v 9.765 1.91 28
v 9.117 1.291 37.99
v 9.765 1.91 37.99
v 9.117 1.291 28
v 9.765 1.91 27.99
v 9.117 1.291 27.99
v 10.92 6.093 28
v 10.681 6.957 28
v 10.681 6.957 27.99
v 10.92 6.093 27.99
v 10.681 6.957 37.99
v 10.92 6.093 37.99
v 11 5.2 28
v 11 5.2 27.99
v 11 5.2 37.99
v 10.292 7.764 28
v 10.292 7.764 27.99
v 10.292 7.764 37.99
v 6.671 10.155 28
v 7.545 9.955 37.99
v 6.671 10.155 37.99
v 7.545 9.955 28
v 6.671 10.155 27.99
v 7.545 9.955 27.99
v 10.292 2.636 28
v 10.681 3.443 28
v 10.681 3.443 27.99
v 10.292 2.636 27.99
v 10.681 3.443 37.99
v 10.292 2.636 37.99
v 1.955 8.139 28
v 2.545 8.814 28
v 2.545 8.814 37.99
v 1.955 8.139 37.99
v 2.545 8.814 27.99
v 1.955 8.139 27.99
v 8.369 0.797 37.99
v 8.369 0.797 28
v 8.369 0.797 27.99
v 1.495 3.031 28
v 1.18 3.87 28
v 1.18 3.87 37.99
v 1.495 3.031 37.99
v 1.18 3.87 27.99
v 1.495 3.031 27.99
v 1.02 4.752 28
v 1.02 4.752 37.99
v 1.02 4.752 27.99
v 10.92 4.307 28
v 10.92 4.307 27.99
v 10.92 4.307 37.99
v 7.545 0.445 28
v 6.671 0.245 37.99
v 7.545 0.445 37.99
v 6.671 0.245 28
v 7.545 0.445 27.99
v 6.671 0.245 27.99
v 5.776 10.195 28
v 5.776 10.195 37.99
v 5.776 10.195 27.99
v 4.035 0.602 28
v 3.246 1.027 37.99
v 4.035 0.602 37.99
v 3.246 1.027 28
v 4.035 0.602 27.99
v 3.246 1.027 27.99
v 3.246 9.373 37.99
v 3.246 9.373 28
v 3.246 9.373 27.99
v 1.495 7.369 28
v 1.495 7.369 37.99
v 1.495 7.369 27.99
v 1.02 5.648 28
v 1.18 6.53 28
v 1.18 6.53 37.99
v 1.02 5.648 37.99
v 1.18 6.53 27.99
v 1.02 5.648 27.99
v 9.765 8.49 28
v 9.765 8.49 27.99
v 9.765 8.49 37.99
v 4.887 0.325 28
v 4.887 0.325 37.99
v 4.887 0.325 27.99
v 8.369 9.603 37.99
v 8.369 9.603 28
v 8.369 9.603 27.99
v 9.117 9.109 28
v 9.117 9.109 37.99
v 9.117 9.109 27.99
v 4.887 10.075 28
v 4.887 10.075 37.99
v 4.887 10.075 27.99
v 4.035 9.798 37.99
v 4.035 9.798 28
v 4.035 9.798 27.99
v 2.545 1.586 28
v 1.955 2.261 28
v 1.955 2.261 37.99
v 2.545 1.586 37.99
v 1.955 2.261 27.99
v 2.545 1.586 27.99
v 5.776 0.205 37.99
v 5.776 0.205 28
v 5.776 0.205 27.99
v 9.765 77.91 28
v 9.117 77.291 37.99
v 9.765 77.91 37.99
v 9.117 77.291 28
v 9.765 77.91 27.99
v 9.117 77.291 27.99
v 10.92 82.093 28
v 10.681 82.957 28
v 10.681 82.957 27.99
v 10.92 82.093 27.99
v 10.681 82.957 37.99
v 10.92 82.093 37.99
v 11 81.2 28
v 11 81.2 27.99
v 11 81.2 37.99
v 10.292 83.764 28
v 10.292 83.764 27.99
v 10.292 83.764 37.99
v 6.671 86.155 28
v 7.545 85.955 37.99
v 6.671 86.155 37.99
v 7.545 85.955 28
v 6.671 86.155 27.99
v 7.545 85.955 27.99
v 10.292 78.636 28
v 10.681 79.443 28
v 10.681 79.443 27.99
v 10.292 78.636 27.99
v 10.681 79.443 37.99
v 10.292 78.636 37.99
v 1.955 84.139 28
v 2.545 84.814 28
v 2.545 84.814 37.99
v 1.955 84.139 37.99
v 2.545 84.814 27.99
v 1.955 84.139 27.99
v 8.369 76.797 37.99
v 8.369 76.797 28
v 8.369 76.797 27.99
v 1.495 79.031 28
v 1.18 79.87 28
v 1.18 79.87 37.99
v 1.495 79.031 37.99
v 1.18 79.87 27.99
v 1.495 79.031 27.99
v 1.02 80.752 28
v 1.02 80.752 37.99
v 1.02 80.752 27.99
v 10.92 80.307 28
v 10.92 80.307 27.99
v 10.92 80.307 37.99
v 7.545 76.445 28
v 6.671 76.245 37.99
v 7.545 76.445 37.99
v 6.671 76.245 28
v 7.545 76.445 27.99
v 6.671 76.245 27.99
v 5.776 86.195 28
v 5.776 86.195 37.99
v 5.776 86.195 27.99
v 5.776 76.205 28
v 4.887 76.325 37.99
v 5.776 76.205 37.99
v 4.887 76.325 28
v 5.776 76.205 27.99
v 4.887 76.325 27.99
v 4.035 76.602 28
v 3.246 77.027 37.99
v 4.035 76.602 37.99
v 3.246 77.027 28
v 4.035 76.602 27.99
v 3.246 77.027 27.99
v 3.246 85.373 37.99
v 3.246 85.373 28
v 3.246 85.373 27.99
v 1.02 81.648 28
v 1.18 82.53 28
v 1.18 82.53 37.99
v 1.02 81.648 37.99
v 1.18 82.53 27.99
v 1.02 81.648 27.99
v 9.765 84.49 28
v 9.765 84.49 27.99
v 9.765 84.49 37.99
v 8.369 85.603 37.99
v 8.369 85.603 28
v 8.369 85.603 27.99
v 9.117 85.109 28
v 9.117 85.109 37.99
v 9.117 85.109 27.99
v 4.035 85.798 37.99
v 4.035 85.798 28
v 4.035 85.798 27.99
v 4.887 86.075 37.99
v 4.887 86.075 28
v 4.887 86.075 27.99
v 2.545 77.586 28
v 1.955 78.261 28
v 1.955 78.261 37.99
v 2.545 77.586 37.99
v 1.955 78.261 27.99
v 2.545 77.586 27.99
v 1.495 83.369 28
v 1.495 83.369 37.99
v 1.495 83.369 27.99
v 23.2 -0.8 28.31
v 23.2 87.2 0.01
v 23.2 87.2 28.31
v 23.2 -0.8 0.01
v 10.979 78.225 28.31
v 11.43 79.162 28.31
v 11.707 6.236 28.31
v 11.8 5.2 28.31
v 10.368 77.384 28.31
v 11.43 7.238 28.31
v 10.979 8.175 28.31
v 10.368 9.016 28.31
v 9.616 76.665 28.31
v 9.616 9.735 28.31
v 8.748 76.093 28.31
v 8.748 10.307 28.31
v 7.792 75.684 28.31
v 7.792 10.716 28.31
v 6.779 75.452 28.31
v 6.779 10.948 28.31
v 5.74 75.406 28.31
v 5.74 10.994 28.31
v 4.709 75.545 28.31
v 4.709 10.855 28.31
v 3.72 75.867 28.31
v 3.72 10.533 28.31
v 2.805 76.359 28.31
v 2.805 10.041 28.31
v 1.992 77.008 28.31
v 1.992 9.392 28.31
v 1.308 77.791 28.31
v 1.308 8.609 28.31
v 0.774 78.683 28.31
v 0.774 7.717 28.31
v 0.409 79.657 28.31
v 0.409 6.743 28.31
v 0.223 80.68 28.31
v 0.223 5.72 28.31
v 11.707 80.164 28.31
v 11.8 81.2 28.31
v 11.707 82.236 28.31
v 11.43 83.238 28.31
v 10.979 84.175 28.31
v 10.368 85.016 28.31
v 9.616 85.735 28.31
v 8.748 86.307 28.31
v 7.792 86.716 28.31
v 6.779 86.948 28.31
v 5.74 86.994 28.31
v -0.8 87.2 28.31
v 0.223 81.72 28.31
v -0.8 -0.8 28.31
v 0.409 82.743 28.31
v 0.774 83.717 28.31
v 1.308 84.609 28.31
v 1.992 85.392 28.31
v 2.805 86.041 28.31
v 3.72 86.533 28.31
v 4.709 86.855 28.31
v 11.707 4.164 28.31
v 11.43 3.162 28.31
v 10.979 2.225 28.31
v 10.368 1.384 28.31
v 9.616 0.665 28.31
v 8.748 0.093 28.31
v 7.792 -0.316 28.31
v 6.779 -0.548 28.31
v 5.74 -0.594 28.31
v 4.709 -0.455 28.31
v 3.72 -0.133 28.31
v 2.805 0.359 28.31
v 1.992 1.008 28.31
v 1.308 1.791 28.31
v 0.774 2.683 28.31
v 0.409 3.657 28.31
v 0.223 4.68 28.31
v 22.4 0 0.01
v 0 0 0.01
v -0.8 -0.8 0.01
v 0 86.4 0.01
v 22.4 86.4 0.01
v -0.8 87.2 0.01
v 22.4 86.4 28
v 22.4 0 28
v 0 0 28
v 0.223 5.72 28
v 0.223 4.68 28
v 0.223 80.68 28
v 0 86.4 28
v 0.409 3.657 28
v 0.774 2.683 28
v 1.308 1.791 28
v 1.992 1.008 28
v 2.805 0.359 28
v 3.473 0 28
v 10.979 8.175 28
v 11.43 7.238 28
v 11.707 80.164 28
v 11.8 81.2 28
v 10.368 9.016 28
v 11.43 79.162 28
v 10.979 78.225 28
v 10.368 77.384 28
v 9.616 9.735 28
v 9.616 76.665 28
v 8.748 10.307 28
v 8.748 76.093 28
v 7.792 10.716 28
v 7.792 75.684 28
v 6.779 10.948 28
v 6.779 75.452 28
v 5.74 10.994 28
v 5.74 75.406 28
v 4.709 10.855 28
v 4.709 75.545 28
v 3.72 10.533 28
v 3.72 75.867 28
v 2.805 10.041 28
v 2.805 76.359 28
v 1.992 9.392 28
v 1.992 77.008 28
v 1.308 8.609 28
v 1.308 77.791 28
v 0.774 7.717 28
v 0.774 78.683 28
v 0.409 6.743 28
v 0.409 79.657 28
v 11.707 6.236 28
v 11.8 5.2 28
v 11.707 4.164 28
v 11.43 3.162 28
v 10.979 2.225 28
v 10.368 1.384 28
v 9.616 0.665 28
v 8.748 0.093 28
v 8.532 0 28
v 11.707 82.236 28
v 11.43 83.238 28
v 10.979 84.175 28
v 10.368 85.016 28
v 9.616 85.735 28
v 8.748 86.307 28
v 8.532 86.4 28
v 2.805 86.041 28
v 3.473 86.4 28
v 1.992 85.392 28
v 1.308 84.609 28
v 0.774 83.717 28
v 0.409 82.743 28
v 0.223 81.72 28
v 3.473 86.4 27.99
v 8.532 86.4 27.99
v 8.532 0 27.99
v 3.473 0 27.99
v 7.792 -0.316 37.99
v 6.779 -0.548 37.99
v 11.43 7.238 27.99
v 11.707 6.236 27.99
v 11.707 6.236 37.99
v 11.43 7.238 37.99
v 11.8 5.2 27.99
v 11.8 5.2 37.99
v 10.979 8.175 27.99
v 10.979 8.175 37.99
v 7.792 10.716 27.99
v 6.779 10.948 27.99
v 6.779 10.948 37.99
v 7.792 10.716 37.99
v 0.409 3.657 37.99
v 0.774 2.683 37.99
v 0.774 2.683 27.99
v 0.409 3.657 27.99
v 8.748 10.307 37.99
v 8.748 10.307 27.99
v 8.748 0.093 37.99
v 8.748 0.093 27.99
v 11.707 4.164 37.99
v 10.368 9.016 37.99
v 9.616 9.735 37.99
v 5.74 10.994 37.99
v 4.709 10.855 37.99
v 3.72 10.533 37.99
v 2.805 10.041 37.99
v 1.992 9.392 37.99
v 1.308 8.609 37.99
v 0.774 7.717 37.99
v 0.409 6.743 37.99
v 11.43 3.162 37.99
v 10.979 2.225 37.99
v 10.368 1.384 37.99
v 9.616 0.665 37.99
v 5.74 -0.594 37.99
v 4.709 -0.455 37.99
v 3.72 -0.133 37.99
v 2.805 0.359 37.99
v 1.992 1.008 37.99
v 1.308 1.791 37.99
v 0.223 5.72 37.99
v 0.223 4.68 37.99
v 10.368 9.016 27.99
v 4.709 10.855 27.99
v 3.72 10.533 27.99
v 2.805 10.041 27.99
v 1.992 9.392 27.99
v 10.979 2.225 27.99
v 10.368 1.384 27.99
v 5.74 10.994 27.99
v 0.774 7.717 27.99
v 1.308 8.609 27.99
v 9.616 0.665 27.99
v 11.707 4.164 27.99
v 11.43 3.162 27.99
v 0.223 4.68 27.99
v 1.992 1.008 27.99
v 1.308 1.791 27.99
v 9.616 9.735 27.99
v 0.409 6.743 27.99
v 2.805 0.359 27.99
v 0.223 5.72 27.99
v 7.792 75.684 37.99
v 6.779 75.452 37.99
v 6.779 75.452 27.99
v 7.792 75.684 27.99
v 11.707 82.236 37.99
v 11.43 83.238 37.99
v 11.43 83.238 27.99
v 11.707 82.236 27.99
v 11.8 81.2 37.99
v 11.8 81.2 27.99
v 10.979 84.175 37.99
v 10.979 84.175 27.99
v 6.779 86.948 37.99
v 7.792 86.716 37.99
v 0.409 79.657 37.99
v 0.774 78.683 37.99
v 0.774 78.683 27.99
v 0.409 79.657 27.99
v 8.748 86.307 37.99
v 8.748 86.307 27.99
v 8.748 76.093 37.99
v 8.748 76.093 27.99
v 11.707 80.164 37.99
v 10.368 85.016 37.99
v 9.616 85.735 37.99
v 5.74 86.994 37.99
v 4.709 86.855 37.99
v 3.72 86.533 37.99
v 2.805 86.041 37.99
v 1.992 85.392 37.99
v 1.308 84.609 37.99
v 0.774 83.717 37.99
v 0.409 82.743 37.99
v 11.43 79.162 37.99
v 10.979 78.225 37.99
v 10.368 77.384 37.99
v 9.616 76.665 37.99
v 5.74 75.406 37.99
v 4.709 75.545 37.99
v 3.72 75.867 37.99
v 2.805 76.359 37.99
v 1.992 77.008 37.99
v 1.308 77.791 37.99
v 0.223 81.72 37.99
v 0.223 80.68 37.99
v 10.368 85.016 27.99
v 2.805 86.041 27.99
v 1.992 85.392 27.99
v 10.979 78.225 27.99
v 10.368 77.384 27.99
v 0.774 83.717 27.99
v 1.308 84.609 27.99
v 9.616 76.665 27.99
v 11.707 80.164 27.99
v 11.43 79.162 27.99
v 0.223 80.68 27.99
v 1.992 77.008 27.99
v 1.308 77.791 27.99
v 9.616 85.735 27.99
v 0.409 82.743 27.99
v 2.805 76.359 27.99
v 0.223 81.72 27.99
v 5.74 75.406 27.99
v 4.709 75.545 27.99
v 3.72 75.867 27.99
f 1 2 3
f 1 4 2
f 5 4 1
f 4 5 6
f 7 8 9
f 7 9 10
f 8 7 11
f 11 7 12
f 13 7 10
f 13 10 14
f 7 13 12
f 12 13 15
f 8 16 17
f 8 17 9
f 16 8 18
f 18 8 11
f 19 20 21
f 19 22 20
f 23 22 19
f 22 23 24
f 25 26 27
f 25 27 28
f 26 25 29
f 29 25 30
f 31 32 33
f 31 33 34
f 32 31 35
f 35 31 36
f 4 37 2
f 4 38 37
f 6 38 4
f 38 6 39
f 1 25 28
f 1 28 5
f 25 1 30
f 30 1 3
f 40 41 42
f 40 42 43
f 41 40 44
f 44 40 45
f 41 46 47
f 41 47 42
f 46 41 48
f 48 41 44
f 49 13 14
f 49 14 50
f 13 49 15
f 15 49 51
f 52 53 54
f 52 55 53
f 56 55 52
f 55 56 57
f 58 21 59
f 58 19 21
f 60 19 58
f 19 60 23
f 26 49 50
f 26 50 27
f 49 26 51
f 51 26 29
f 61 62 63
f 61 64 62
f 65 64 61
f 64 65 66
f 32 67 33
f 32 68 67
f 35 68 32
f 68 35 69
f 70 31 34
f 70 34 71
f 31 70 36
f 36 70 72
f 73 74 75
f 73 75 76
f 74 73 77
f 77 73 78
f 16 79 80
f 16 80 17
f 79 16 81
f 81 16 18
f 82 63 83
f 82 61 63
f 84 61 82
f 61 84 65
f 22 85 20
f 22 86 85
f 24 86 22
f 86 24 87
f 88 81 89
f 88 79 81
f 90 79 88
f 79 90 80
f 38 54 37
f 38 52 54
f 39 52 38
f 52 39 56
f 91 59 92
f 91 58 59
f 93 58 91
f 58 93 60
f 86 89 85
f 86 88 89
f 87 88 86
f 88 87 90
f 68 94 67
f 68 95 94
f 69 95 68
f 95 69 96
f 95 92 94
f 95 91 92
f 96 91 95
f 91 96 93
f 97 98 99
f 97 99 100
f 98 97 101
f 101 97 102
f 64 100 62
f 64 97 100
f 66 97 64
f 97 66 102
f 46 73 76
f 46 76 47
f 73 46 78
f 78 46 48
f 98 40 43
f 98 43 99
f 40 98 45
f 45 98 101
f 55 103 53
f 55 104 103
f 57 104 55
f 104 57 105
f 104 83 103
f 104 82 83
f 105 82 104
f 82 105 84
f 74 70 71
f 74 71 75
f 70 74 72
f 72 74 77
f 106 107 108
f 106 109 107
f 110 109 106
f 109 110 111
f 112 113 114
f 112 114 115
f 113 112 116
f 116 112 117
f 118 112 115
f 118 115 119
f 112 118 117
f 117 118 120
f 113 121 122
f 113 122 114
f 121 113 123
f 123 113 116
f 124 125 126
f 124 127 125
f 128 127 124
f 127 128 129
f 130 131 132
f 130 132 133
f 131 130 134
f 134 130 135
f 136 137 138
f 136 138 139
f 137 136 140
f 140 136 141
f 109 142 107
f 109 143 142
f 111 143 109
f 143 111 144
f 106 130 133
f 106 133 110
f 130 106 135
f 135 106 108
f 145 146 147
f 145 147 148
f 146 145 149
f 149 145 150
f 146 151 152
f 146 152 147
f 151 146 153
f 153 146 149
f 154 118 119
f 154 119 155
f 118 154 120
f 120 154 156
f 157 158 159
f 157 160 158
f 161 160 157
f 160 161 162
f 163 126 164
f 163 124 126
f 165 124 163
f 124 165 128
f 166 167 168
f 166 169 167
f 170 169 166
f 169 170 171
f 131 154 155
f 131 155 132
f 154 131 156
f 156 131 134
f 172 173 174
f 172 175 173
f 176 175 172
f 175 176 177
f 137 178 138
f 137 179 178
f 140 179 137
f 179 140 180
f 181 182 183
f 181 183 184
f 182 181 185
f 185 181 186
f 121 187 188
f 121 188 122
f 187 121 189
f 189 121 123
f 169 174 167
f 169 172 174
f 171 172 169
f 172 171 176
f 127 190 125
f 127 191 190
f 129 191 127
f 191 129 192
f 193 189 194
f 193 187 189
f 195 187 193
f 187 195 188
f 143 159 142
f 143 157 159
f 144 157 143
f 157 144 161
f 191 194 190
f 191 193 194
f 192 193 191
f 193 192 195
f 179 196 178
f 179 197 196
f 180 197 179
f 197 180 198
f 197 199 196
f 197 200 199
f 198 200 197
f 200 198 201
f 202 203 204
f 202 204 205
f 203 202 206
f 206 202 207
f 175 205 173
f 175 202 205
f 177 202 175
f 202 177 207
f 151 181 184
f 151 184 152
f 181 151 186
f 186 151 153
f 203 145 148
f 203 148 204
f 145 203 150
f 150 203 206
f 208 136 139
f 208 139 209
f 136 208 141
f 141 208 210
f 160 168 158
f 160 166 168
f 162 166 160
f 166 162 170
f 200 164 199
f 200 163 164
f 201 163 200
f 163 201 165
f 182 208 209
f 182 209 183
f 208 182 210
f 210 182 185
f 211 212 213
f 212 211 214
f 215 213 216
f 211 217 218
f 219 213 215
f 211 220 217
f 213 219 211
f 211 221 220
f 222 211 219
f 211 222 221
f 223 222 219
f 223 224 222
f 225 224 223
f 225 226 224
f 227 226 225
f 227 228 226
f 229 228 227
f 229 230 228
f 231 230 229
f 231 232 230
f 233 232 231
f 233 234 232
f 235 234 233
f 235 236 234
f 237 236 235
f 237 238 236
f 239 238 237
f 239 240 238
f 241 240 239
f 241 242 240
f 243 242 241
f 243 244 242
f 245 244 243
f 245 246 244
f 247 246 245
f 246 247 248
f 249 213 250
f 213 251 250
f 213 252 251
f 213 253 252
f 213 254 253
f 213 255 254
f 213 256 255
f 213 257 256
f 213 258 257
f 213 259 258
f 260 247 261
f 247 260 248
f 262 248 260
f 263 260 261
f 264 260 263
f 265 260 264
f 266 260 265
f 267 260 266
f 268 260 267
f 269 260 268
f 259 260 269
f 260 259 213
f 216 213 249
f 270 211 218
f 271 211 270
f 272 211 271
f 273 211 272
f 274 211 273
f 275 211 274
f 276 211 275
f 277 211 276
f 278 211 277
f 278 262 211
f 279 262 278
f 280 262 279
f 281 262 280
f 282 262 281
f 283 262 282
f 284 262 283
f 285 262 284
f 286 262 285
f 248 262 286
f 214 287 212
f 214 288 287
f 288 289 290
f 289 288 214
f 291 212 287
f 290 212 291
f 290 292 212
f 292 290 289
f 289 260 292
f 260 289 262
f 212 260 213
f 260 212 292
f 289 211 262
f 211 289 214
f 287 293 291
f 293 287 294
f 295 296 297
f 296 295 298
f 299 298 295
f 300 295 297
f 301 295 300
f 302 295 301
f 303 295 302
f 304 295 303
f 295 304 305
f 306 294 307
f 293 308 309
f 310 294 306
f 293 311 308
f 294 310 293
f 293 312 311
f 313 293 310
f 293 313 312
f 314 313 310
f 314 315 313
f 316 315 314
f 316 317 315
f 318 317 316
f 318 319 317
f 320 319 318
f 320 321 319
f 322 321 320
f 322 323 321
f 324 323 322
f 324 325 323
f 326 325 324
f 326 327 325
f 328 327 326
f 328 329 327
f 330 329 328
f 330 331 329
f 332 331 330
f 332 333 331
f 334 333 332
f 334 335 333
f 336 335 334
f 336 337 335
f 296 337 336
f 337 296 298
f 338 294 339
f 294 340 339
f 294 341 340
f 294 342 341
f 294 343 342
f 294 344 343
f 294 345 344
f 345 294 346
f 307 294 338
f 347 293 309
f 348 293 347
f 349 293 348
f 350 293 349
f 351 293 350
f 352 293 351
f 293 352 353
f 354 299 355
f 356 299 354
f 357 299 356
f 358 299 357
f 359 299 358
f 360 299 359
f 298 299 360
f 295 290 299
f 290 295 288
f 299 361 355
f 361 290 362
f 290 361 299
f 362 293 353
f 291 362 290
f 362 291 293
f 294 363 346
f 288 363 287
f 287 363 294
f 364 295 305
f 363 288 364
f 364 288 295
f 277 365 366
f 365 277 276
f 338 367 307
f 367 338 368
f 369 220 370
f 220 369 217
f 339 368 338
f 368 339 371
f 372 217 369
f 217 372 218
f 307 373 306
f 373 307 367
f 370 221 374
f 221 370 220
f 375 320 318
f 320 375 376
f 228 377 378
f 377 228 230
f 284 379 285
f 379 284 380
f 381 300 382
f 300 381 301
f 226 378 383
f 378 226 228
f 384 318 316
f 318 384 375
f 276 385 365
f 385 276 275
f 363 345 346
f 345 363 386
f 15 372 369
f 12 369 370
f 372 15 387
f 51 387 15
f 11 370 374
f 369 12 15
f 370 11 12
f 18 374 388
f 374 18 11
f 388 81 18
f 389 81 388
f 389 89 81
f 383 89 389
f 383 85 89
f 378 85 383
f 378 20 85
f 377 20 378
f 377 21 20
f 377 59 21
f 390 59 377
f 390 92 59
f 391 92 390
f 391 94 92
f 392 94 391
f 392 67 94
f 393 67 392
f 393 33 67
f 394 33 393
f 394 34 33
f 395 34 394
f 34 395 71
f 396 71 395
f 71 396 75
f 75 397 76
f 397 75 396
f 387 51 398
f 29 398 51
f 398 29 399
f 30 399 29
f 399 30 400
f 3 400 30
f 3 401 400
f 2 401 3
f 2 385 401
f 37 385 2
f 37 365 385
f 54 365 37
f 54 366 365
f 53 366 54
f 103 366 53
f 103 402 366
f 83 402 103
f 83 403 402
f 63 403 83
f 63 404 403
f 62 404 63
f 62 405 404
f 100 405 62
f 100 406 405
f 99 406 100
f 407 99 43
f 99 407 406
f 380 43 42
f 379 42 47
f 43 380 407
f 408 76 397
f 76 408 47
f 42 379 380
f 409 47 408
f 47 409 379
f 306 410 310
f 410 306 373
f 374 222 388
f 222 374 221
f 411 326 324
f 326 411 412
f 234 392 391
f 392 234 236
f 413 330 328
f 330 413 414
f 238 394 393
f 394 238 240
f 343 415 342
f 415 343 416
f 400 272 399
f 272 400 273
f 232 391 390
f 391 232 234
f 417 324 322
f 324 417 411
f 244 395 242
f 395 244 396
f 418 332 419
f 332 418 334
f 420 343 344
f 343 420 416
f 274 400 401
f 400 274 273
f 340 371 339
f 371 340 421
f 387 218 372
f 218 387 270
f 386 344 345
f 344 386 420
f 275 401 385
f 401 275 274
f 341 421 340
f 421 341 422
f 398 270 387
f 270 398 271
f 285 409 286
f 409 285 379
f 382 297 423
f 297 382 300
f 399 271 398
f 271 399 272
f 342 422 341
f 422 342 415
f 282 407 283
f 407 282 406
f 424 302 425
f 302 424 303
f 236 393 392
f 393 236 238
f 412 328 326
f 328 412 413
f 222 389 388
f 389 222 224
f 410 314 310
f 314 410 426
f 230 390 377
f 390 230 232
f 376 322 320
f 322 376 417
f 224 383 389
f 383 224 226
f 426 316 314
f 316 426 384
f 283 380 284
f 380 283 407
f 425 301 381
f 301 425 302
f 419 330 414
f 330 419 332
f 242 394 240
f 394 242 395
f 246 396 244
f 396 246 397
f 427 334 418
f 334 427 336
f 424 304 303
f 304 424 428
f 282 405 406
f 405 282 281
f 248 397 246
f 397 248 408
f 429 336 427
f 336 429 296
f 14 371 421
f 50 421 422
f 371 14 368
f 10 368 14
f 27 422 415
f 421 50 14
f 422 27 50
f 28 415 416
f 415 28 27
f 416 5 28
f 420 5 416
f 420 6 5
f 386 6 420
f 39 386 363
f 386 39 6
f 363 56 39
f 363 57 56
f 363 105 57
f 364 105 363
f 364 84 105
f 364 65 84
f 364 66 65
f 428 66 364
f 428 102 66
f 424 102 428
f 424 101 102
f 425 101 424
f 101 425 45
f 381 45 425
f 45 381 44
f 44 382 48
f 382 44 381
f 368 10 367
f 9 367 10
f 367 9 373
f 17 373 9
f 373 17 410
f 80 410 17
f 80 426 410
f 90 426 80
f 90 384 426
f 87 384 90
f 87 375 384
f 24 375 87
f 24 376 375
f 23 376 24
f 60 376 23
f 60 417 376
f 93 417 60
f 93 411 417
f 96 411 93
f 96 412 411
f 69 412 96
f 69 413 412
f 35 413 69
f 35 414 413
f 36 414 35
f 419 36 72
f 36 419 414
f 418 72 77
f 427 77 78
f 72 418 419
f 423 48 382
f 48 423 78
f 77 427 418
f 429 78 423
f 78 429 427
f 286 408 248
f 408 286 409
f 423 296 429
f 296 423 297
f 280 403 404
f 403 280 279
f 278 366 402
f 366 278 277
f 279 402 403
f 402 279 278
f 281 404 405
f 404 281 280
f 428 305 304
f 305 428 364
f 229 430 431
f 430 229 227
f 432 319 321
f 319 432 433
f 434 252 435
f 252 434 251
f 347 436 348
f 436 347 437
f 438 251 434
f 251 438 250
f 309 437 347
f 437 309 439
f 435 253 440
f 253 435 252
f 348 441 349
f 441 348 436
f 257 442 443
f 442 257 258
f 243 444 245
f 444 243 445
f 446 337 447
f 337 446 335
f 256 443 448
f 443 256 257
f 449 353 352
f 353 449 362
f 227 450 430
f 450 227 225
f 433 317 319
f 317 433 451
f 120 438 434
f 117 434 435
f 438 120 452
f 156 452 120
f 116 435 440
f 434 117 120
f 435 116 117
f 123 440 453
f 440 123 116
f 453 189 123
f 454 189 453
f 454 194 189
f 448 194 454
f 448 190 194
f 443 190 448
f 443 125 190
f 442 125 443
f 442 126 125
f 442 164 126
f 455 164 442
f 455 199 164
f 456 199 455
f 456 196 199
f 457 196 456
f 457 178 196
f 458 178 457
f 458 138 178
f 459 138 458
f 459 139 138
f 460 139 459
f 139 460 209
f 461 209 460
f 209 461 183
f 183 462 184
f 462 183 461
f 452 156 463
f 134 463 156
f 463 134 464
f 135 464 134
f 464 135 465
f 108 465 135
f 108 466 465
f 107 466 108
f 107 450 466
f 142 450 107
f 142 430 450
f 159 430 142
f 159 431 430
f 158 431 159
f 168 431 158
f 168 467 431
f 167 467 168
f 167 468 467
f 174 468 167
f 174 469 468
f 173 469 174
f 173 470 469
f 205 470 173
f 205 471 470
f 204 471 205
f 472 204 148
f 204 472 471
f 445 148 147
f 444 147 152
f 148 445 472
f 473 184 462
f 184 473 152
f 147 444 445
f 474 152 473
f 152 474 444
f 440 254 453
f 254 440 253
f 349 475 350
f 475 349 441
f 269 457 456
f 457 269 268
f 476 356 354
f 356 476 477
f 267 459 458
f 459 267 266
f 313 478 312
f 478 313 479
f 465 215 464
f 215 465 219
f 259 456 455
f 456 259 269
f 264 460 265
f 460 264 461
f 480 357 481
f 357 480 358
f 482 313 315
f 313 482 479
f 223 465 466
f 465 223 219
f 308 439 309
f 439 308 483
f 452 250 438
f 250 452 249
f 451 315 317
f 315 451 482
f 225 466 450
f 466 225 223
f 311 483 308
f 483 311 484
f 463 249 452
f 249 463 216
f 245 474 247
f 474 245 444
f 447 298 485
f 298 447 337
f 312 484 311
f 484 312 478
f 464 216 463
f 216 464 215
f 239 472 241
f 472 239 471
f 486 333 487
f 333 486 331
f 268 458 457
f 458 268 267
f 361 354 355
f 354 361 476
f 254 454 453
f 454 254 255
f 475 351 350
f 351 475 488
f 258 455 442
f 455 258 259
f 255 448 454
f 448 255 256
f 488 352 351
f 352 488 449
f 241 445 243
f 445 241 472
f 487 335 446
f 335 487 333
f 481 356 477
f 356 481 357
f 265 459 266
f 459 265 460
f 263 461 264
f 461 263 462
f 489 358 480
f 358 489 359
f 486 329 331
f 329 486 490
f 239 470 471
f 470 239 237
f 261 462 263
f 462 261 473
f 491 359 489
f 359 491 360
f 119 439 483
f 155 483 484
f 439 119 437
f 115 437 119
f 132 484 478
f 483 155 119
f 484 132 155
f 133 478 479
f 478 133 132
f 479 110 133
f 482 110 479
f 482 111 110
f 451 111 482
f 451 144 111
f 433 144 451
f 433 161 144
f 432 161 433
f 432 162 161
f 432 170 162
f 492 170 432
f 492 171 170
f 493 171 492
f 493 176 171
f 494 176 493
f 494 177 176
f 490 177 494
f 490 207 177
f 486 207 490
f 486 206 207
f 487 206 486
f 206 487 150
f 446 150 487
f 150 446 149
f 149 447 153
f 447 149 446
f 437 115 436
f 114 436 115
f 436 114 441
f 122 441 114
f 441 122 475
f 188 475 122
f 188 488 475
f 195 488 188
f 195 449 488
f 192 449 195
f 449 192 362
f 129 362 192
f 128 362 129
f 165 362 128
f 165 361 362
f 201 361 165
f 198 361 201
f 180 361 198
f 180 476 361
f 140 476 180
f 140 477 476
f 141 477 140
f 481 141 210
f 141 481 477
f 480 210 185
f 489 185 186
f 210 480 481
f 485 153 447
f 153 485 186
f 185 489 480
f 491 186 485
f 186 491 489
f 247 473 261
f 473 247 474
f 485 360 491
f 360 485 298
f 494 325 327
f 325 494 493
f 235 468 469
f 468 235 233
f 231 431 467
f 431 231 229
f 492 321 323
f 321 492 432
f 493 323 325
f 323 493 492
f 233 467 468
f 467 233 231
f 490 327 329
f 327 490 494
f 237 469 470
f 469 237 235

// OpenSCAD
// Dust cap
// 15-12-2024 Printed but brd_w=20+0.4 is a bit too tight!

// Some material definitions
// defaults in prusa slicer 0.15 height (0.2 first layer)
layer_1=0.2;
layer_n=0.15; l2=layer_n*2;
base_h=layer_1+layer_n*8; // 1.4
p=0.4; 2p=p*2; 4p=2*2p;

// Rx hat dimensions
brd_l=86+0.4; // print is 80 but antenna sticks out
space=1; space2=2*space;
brd_w=20+space2+0.4;
brd_h=28;
ant_d=10; ant_r=ant_d/2;
ant_d2=76; 

difference() {
    translate([-2p,-2p,0.01])
        cube([brd_w+4p,brd_l+4p,brd_h+l2]);
    cube([brd_w, brd_l, 28]);
    antenna();
}

module antenna(
    per  = 0,  // perimeter to use
    hght = 100
) {
    translate([ant_r+space,(brd_l-ant_d2)/2,0])
        cylinder(h=hght,r=ant_r+per,$fn=35);
    translate([ant_r+space,(brd_l+ant_d2)/2,0])
        cylinder(h=hght,r=ant_r+per,$fn=35);
}

translate([0,0,brd_h-0.01]) 
    difference() {
        antenna(per=2p,hght=10);
        translate([0,0,-0.01])
            antenna(hght=10+0.02);
    }
